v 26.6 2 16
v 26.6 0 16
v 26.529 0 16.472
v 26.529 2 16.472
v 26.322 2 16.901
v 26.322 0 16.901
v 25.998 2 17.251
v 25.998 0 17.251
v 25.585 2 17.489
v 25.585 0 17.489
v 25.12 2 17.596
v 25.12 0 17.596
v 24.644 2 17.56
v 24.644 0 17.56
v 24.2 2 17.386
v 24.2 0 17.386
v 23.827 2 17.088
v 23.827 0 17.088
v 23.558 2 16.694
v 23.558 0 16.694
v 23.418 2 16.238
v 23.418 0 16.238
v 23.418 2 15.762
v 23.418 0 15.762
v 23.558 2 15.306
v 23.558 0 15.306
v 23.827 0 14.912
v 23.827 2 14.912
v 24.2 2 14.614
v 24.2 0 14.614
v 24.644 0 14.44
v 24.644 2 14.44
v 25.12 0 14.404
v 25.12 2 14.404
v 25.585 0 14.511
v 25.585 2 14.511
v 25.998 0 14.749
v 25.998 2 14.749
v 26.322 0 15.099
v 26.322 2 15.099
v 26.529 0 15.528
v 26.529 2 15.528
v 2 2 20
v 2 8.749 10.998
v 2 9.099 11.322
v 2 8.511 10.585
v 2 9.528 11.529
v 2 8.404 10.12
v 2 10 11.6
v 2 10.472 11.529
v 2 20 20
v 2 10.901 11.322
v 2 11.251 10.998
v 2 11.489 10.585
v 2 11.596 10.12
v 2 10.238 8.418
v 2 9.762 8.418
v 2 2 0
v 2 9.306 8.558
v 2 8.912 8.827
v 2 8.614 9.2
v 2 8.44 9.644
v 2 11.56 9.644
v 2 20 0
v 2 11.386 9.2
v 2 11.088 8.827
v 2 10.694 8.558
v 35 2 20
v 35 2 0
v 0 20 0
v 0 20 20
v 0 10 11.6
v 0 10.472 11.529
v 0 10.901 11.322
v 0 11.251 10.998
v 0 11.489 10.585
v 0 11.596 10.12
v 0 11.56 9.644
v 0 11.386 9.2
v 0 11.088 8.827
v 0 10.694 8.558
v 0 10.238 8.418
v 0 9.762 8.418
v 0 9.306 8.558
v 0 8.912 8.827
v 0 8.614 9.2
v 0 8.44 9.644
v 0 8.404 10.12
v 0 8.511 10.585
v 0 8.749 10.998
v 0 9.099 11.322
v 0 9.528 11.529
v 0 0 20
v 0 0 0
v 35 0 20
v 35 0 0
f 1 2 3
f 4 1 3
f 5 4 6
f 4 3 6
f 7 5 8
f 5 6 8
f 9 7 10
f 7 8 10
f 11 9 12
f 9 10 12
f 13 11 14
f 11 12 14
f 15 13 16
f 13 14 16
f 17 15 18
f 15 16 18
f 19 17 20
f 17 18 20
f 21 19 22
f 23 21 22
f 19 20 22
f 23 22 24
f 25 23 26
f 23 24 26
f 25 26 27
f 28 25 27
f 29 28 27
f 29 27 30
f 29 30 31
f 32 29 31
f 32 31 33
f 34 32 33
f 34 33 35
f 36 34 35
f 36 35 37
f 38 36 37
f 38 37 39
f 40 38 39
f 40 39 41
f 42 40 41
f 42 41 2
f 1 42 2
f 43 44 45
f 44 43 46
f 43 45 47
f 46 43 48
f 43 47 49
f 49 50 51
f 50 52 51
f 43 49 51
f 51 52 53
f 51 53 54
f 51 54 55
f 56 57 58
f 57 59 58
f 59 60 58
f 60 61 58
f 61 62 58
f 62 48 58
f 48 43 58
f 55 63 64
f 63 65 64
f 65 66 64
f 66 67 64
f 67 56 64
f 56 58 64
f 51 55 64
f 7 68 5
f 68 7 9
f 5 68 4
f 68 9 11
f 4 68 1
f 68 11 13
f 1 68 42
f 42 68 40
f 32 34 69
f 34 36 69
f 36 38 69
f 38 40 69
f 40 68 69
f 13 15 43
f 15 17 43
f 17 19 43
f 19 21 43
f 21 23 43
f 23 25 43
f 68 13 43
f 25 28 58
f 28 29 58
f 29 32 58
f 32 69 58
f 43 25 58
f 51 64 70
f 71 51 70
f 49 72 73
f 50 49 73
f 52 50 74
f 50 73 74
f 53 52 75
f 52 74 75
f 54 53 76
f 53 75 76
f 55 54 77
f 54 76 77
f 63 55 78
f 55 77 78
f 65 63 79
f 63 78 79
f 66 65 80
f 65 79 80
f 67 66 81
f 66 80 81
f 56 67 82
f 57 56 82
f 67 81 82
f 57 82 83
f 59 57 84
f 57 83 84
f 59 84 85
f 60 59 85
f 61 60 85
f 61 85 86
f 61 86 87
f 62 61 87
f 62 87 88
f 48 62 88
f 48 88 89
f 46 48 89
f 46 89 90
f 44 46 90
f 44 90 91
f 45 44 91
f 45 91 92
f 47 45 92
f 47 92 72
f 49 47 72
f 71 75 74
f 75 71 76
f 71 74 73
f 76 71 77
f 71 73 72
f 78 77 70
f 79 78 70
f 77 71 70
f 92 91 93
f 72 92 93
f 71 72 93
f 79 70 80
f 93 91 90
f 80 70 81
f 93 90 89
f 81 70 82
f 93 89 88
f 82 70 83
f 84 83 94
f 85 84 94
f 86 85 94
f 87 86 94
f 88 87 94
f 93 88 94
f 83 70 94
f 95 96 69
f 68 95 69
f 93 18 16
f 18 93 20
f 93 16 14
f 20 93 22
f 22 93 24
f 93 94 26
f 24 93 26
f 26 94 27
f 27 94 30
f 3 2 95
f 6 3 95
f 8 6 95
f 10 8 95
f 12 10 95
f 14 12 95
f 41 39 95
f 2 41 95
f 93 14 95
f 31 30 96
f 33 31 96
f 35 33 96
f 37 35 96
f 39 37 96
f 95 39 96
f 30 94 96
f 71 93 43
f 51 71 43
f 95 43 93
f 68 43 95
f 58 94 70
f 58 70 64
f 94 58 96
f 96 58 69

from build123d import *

# Parameters (mm, degrees)
EXTRUDE_1_DEPTH     = 20
SKETCH_3_R          = 1.6
CUT_EXTRUDE_2_DEPTH = 36
SKETCH_4_R          = 1.6
CUT_EXTRUDE_3_DEPTH = 21


with BuildPart() as part:
    # Эскиз1 → Бобышка-Вытянуть1 (new body)
    with BuildSketch(Plane.XY):
        Polygon((0, 0), (35, 0), (35, 2), (2, 2), (2, 20), (0, 20), align=None)
    extrude(amount=EXTRUDE_1_DEPTH)

    # Эскиз3 → Вырез-Вытянуть2 (cut, through all)
    with BuildSketch(Plane.ZY):
        with Locations((10, 10)):
            Circle(SKETCH_3_R)
    extrude(amount=-CUT_EXTRUDE_2_DEPTH, mode=Mode.SUBTRACT)

    # Эскиз4 → Вырез-Вытянуть3 (cut, through all)
    with BuildSketch(Plane.XZ):
        with Locations((25, 16)):
            Circle(SKETCH_4_R)
    extrude(amount=-CUT_EXTRUDE_3_DEPTH, mode=Mode.SUBTRACT)


solid = part.part
